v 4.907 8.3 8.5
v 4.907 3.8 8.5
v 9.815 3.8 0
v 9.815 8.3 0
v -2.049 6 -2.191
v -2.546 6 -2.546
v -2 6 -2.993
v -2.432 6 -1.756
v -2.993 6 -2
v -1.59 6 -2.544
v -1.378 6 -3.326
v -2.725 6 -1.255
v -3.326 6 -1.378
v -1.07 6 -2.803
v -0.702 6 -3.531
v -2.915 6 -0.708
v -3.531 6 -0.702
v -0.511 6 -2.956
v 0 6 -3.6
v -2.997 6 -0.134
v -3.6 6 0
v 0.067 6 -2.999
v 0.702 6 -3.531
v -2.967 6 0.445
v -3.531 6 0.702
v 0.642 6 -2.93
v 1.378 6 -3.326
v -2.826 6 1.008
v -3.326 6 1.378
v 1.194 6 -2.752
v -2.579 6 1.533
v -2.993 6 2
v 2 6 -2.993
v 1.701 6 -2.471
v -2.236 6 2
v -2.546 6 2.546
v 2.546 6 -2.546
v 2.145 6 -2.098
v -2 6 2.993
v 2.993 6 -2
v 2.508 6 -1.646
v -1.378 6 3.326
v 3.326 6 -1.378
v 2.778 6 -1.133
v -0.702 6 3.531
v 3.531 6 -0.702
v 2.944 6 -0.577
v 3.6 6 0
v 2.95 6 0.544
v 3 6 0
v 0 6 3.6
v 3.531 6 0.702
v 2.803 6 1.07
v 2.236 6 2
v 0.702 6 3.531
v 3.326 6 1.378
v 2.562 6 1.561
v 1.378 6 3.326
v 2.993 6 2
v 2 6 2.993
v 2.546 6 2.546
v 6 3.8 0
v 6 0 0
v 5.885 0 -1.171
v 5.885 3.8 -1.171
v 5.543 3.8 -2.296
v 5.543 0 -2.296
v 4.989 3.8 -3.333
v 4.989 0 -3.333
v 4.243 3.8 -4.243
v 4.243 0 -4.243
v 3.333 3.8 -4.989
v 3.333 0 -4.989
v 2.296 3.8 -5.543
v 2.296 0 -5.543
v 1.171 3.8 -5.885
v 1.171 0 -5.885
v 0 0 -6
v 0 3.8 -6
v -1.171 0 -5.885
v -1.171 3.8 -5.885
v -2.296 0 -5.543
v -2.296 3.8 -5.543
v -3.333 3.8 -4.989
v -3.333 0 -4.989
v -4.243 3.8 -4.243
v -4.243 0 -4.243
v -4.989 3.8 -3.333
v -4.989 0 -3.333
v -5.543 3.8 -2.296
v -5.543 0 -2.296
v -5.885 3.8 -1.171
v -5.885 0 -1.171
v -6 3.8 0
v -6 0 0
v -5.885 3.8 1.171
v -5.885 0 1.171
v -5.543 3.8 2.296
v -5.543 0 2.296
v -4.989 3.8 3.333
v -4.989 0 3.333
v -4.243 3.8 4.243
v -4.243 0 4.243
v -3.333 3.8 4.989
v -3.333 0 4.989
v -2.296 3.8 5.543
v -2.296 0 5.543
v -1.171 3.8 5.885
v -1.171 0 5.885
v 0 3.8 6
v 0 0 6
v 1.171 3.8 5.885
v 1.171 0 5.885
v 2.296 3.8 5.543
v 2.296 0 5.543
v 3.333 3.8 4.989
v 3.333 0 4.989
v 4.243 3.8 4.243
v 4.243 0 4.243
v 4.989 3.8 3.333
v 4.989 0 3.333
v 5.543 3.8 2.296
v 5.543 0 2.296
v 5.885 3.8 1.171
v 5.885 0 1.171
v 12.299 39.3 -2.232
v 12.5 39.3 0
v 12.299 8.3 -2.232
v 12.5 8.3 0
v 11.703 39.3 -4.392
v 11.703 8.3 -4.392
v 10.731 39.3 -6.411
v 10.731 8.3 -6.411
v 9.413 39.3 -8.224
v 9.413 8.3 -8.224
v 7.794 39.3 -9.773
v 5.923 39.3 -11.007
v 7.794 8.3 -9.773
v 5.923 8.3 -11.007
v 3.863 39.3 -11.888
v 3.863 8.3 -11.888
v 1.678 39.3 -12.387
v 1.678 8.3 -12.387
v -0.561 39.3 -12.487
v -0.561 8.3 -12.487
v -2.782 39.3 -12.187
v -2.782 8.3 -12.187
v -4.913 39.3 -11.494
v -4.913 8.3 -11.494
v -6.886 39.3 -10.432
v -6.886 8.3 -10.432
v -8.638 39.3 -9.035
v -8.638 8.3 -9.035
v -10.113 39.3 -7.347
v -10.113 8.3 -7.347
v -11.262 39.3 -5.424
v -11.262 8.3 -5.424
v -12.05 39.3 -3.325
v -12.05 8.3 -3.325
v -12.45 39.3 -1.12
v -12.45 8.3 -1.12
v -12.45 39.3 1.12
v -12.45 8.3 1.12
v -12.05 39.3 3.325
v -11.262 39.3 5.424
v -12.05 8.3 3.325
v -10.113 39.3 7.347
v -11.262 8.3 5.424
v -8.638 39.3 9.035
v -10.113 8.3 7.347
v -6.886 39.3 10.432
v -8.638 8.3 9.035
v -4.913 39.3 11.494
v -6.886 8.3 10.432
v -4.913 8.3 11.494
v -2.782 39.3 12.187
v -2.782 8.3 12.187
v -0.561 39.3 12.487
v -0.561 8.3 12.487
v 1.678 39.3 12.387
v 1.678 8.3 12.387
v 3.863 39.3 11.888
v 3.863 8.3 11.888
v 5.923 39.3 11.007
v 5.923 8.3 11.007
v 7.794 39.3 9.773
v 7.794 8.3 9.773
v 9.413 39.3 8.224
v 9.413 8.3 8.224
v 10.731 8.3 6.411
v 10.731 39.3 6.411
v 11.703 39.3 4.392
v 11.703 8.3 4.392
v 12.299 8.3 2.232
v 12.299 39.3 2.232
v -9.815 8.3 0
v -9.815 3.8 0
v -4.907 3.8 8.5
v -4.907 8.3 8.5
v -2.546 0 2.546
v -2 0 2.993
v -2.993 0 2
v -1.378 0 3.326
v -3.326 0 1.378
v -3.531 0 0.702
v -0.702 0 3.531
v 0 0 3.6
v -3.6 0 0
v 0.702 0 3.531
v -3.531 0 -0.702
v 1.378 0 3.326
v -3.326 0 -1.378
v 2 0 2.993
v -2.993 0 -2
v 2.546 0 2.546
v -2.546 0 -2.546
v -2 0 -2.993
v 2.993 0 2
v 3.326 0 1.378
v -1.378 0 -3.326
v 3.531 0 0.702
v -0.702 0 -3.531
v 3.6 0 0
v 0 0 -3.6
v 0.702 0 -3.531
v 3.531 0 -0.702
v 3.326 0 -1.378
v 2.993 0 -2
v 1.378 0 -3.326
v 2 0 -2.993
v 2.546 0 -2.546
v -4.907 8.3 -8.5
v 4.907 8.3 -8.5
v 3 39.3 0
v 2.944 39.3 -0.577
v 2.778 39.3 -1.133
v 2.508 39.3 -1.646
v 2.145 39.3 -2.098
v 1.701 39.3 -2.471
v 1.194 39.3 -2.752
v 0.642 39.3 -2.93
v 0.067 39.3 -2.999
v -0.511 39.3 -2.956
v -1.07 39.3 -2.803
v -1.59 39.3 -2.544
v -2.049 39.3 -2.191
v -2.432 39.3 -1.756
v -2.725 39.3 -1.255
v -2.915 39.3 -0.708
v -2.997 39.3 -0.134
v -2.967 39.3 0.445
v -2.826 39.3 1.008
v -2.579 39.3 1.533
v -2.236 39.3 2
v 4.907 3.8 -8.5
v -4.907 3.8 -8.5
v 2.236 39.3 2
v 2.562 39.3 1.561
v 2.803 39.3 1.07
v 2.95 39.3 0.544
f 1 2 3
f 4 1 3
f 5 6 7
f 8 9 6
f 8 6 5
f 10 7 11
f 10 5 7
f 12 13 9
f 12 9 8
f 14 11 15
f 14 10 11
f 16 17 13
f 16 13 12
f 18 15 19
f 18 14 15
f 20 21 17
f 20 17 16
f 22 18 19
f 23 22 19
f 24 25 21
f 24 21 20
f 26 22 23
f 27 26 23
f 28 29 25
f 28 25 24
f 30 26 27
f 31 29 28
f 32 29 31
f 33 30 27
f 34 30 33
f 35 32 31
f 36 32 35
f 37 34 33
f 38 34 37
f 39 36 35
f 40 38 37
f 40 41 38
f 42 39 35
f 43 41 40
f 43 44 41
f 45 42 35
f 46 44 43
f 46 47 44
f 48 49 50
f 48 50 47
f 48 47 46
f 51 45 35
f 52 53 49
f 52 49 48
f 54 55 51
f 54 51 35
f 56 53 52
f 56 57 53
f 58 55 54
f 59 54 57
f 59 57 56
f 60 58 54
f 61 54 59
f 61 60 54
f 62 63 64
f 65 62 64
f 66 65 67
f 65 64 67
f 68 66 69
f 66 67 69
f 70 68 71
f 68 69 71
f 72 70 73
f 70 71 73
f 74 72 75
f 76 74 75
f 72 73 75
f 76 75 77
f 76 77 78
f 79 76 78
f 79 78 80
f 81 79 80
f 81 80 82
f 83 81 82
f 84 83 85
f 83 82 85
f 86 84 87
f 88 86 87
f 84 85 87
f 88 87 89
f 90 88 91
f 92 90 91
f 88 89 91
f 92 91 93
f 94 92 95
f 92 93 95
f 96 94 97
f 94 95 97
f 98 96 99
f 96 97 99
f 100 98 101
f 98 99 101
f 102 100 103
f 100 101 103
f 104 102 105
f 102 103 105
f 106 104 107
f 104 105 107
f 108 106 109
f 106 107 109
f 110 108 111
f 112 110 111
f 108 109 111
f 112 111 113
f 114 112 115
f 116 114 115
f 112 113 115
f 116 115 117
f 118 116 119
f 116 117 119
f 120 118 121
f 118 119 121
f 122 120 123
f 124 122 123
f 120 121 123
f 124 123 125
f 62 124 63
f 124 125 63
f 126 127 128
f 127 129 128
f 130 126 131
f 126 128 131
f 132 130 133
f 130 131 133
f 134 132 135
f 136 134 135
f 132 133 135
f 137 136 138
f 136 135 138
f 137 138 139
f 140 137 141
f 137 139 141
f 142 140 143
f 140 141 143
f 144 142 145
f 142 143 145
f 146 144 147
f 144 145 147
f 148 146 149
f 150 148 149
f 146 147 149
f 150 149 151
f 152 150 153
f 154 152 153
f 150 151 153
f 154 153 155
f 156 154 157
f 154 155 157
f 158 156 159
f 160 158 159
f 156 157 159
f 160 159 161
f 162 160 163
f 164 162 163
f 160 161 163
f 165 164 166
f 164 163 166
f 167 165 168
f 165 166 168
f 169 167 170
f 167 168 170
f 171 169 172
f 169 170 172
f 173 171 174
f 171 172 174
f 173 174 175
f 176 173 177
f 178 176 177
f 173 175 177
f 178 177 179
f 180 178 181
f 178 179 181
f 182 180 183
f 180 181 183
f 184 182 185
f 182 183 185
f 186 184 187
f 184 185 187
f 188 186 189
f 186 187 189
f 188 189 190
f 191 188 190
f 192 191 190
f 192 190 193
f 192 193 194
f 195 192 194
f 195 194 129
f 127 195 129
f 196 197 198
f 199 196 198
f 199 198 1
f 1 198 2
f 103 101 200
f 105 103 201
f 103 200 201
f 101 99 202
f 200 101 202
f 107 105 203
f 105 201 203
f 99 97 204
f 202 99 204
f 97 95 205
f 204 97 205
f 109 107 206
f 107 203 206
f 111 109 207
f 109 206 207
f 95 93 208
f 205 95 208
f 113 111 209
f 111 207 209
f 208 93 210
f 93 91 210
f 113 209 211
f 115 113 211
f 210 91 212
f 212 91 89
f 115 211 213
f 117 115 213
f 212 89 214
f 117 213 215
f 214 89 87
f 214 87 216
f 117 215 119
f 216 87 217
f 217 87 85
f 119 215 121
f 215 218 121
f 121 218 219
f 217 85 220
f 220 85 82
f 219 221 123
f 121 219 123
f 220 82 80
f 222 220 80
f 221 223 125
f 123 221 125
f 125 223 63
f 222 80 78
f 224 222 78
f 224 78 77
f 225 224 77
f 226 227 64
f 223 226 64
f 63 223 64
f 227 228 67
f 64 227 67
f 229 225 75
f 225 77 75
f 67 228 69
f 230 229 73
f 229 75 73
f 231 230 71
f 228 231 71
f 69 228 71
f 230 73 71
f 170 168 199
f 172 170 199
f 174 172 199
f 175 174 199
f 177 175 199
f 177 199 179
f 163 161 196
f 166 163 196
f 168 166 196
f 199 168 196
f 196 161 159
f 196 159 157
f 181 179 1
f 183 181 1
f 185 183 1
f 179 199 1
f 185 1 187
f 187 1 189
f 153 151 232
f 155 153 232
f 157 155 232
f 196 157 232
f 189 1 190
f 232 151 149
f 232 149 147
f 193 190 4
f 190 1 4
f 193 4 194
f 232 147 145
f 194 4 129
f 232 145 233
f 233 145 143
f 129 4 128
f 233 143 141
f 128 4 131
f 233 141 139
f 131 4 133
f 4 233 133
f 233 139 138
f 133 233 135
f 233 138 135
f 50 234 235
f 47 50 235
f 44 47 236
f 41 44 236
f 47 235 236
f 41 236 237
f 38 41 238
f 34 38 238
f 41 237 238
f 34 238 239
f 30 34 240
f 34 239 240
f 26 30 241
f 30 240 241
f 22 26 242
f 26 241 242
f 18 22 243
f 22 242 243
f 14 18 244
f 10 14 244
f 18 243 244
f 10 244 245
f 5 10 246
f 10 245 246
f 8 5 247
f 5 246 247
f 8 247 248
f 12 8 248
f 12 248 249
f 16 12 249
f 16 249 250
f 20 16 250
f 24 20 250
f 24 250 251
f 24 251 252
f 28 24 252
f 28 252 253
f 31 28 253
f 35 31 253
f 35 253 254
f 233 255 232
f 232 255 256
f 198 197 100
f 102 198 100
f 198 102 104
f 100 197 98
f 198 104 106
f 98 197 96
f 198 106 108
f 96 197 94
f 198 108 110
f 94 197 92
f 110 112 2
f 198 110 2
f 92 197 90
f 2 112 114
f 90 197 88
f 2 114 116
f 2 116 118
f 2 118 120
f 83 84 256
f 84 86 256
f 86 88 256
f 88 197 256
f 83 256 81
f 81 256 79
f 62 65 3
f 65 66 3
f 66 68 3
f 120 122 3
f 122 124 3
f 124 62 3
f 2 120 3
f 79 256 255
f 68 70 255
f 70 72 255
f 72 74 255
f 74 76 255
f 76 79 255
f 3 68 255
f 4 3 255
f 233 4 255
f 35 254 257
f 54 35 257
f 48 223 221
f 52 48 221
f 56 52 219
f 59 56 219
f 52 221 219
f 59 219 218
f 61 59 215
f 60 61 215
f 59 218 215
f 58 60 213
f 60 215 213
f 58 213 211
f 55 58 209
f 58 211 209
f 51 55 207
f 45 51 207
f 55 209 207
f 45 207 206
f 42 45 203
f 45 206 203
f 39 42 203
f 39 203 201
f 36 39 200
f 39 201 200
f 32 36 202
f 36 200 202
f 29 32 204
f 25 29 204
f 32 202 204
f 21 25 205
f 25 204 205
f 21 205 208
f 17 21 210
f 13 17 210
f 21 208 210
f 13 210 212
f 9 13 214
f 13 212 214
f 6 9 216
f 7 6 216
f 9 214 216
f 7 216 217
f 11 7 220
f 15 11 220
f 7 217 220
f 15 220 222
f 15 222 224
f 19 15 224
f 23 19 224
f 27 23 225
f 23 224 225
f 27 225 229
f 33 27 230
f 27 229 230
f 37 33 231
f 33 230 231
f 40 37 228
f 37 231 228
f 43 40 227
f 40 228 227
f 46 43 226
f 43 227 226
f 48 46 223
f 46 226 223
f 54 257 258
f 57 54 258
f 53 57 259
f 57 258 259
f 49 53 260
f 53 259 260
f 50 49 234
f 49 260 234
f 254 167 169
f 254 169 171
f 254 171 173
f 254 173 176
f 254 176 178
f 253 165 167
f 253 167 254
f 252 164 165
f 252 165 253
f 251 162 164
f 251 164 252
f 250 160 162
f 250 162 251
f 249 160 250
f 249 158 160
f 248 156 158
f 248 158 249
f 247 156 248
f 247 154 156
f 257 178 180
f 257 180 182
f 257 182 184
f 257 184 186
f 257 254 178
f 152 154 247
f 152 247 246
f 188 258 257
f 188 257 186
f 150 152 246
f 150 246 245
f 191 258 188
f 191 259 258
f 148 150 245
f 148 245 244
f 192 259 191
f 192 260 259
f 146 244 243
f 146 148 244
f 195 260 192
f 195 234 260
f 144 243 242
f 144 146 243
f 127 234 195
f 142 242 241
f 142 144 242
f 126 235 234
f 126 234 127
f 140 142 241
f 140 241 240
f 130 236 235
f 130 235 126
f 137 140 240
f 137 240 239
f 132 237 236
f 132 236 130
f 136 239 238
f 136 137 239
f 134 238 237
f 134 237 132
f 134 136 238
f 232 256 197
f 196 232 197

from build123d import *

# Parameters (mm, degrees)
SKETCH1_R           = 6
BOSS_EXTRUDE1_DEPTH = 3.8
BOSS_EXTRUDE2_DEPTH = 4.5
SKETCH3_R           = 12.5
BOSS_EXTRUDE3_DEPTH = 4
SKETCH4_R           = 12.5
BOSS_EXTRUDE4_DEPTH = 27
CUT_EXTRUDE1_DEPTH  = 40.3
SKETCH6_R           = 3.6
CUT_EXTRUDE2_DEPTH  = 6


with BuildPart() as part:
    # Sketch1 → Boss-Extrude1 (new body)
    with BuildSketch(Plane(origin=(0, 0, 0), x_dir=(1, 0, 0), z_dir=(0, 1, 0))):
        Circle(SKETCH1_R)
    extrude(amount=BOSS_EXTRUDE1_DEPTH)

    # Sketch2 → Boss-Extrude2 (add)
    with BuildSketch(Plane(origin=(0, 3.8, 0), x_dir=(1, 0, 0), z_dir=(0, 1, 0))):
        Polygon((9.814954576, 0), (4.907477288, 8.5), (-4.907477288, 8.5), (-9.814954576, 0), (-4.907477288, -8.5), (4.907477288, -8.5), align=None)
    extrude(amount=BOSS_EXTRUDE2_DEPTH)

    # Sketch3 → Boss-Extrude3 (add)
    with BuildSketch(Plane(origin=(0, 8.3, 0), x_dir=(1, 0, 0), z_dir=(0, 1, 0))):
        Circle(SKETCH3_R)
    extrude(amount=BOSS_EXTRUDE3_DEPTH)

    # Sketch4 → Boss-Extrude4 (add)
    with BuildSketch(Plane(origin=(0, 12.3, 0), x_dir=(1, 0, 0), z_dir=(0, 1, 0))):
        Circle(SKETCH4_R)
    extrude(amount=BOSS_EXTRUDE4_DEPTH)

    # Sketch5 → Cut-Extrude1 (cut, through all)
    with BuildSketch(Plane(origin=(0, 39.3, 0), x_dir=(1, 0, 0), z_dir=(0, 1, 0))):
        with BuildLine():
            ThreePointArc((3, 0), (-1.070466269, 2.802517077), (-2.236067977, -2))
            Line((-2.236067977, -2), (2.236067977, -2))
            ThreePointArc((2.236067977, -2), (2.802517077, -1.070466269), (3, 0))
        make_face()
    extrude(amount=-CUT_EXTRUDE1_DEPTH, mode=Mode.SUBTRACT)

    # Sketch6 → Cut-Extrude2 (cut)
    with BuildSketch(Plane.XZ):
        Circle(SKETCH6_R)
    extrude(amount=-CUT_EXTRUDE2_DEPTH, mode=Mode.SUBTRACT)


solid = part.part
